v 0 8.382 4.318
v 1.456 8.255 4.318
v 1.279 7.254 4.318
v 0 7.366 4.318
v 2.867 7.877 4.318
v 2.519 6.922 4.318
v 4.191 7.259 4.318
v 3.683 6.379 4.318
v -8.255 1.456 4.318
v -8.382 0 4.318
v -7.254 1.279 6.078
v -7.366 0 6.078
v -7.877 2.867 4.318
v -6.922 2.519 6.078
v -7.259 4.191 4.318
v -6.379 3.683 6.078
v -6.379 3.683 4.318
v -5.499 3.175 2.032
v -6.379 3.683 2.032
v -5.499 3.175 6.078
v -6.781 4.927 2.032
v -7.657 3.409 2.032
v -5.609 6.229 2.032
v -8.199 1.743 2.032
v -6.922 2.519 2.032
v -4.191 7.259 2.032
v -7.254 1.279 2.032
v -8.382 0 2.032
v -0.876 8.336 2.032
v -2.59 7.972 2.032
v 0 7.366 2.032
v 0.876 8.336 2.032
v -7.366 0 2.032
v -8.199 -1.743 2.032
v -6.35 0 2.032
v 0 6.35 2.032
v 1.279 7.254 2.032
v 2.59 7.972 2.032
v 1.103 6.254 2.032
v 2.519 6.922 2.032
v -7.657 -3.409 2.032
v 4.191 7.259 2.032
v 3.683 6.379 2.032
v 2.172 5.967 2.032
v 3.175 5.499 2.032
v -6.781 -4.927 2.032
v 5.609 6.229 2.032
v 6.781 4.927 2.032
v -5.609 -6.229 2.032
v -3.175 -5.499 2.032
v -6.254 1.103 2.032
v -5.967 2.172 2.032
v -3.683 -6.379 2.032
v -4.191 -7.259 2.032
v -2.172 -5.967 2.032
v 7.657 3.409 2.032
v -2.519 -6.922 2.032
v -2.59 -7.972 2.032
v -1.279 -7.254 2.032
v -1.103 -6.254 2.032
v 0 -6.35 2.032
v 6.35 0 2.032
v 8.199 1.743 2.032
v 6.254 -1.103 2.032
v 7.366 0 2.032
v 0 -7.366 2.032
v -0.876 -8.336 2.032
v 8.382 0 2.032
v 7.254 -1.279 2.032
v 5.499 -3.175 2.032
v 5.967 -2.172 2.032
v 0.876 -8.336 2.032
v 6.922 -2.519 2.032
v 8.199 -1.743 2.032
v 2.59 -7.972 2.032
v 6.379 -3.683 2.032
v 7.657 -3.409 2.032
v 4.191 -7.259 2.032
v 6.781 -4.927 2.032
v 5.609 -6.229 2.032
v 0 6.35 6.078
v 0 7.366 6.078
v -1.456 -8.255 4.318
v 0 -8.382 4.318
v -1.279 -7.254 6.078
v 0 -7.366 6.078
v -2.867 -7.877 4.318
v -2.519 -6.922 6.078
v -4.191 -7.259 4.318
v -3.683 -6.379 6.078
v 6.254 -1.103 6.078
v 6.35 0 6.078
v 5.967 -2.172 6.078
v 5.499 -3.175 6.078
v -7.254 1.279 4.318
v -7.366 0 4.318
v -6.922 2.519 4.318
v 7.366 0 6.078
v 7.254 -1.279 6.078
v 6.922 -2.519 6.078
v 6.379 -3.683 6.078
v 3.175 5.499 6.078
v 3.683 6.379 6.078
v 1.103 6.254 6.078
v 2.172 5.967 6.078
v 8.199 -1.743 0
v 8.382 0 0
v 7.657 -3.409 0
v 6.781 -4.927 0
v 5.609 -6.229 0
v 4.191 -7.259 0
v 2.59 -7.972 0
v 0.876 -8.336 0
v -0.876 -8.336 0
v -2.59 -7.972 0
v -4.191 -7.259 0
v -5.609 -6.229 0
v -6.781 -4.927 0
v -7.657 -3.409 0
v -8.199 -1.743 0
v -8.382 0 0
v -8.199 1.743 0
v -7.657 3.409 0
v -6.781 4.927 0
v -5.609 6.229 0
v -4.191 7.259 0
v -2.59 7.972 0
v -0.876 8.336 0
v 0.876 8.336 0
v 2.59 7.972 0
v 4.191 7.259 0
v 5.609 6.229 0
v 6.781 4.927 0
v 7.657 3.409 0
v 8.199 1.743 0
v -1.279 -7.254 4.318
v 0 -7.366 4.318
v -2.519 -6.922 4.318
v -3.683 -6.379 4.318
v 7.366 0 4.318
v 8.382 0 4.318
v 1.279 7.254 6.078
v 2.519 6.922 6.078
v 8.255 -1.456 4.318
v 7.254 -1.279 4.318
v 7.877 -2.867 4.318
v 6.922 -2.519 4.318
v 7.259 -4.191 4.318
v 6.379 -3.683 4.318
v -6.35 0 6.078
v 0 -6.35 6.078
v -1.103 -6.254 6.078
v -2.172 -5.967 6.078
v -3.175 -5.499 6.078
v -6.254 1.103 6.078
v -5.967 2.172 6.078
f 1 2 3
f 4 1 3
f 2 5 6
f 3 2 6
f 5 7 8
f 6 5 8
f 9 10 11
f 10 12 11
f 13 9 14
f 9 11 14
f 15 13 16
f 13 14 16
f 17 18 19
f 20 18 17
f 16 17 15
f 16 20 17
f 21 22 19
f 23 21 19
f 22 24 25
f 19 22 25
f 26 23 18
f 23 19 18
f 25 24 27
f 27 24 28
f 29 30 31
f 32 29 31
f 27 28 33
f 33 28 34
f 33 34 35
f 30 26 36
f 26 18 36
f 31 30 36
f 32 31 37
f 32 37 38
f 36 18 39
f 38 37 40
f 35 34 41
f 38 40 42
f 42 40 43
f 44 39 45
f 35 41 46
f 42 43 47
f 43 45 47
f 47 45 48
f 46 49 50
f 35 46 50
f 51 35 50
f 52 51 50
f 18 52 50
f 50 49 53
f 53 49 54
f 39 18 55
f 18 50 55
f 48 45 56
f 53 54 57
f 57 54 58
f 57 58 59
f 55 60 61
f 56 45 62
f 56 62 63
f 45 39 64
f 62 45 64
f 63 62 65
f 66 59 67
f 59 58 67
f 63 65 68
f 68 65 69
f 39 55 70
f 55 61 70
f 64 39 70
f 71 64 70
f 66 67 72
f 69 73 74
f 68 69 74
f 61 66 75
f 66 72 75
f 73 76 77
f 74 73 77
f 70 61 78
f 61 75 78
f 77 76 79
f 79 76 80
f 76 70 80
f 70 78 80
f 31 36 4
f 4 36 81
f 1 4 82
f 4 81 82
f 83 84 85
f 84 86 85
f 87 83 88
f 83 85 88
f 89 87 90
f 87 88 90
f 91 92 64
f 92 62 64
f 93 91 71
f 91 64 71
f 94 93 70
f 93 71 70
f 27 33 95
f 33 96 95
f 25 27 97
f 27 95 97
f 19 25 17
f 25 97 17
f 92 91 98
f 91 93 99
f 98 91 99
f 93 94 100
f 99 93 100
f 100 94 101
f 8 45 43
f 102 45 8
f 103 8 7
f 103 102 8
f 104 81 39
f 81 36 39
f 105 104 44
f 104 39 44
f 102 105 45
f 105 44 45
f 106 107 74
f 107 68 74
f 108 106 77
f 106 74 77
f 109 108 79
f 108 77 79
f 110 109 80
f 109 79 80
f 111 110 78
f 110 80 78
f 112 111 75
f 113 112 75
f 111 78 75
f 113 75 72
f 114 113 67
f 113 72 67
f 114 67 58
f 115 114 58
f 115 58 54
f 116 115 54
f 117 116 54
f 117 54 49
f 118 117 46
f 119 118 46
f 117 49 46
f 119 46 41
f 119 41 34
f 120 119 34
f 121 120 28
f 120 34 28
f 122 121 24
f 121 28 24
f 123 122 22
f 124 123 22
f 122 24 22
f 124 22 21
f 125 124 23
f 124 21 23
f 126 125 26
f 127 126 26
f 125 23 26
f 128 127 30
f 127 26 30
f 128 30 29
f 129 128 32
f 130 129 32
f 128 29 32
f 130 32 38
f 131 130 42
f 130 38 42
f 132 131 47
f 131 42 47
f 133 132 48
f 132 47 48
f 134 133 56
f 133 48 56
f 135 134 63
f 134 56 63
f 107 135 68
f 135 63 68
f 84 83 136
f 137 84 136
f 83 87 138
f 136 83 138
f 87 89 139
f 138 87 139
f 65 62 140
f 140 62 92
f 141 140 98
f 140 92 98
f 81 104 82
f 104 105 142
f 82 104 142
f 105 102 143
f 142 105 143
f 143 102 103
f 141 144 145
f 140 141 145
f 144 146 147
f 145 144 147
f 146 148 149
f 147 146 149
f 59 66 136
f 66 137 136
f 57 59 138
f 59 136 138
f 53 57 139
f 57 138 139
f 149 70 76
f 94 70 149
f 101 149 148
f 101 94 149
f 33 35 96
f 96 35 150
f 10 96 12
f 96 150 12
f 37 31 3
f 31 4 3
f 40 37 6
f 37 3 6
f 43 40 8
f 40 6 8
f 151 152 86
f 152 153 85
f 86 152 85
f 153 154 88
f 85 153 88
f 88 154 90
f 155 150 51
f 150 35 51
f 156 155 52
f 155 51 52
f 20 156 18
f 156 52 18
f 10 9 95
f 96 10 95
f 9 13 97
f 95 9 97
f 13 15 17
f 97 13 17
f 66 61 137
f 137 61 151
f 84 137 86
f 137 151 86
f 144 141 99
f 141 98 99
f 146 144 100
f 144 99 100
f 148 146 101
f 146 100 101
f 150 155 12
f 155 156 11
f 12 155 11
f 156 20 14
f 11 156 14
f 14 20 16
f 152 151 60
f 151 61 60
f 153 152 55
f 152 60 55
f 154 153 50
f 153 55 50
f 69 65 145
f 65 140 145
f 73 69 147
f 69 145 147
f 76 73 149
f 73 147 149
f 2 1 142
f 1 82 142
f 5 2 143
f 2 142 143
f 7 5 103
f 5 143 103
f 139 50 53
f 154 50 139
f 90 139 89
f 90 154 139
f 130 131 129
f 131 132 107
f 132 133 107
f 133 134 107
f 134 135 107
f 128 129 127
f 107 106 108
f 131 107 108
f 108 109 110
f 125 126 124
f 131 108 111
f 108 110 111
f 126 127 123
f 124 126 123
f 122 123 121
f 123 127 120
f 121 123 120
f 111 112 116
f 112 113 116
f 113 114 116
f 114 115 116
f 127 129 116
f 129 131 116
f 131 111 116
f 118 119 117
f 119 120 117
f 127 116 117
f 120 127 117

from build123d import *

# Parameters (mm, degrees)
F1_ANGLE = 30
F2_COUNT = 4


with BuildPart() as f1:
    # F0 (on Front) → F1 (revolve)
    with BuildSketch(Plane.XZ):
        Polygon((7.366, 2.032), (7.366, 4.318), (8.382, 4.318), (7.366, 6.0777636205), (6.35, 6.0777636205), (6.35, 2.032), align=None)
    revolve(axis=Axis((0, 0, 1.016), (0, 0, -1)), revolution_arc=F1_ANGLE)


with BuildPart() as f2_1:
    # F2: instance of F1
    add(f1.part.rotate(Axis((0, 0, 1.016), (0, 0, -1)), 1 * 360 / F2_COUNT))


with BuildPart() as f2_2:
    # F2: instance of F1
    add(f1.part.rotate(Axis((0, 0, 1.016), (0, 0, -1)), 2 * 360 / F2_COUNT))


with BuildPart() as f2_3:
    # F2: instance of F1
    add(f1.part.rotate(Axis((0, 0, 1.016), (0, 0, -1)), 3 * 360 / F2_COUNT))


with BuildPart() as f1_1:
    add(f1.part)

    add(f2_1.part)  # F3 merges F2_1

    add(f2_2.part)  # F3 merges F2_2

    add(f2_3.part)  # F3 merges F2_3
    # F0 (on Front) → F3 (revolve)
    with BuildSketch(Plane.XZ):
        Polygon((8.382, 2.032), (7.366, 2.032), (6.35, 2.032), (0, 2.032), (0, 0), (8.382, 0), align=None)
    revolve(axis=Axis((0, 0, 1.016), (0, 0, -1)))


solid = f1_1.part
